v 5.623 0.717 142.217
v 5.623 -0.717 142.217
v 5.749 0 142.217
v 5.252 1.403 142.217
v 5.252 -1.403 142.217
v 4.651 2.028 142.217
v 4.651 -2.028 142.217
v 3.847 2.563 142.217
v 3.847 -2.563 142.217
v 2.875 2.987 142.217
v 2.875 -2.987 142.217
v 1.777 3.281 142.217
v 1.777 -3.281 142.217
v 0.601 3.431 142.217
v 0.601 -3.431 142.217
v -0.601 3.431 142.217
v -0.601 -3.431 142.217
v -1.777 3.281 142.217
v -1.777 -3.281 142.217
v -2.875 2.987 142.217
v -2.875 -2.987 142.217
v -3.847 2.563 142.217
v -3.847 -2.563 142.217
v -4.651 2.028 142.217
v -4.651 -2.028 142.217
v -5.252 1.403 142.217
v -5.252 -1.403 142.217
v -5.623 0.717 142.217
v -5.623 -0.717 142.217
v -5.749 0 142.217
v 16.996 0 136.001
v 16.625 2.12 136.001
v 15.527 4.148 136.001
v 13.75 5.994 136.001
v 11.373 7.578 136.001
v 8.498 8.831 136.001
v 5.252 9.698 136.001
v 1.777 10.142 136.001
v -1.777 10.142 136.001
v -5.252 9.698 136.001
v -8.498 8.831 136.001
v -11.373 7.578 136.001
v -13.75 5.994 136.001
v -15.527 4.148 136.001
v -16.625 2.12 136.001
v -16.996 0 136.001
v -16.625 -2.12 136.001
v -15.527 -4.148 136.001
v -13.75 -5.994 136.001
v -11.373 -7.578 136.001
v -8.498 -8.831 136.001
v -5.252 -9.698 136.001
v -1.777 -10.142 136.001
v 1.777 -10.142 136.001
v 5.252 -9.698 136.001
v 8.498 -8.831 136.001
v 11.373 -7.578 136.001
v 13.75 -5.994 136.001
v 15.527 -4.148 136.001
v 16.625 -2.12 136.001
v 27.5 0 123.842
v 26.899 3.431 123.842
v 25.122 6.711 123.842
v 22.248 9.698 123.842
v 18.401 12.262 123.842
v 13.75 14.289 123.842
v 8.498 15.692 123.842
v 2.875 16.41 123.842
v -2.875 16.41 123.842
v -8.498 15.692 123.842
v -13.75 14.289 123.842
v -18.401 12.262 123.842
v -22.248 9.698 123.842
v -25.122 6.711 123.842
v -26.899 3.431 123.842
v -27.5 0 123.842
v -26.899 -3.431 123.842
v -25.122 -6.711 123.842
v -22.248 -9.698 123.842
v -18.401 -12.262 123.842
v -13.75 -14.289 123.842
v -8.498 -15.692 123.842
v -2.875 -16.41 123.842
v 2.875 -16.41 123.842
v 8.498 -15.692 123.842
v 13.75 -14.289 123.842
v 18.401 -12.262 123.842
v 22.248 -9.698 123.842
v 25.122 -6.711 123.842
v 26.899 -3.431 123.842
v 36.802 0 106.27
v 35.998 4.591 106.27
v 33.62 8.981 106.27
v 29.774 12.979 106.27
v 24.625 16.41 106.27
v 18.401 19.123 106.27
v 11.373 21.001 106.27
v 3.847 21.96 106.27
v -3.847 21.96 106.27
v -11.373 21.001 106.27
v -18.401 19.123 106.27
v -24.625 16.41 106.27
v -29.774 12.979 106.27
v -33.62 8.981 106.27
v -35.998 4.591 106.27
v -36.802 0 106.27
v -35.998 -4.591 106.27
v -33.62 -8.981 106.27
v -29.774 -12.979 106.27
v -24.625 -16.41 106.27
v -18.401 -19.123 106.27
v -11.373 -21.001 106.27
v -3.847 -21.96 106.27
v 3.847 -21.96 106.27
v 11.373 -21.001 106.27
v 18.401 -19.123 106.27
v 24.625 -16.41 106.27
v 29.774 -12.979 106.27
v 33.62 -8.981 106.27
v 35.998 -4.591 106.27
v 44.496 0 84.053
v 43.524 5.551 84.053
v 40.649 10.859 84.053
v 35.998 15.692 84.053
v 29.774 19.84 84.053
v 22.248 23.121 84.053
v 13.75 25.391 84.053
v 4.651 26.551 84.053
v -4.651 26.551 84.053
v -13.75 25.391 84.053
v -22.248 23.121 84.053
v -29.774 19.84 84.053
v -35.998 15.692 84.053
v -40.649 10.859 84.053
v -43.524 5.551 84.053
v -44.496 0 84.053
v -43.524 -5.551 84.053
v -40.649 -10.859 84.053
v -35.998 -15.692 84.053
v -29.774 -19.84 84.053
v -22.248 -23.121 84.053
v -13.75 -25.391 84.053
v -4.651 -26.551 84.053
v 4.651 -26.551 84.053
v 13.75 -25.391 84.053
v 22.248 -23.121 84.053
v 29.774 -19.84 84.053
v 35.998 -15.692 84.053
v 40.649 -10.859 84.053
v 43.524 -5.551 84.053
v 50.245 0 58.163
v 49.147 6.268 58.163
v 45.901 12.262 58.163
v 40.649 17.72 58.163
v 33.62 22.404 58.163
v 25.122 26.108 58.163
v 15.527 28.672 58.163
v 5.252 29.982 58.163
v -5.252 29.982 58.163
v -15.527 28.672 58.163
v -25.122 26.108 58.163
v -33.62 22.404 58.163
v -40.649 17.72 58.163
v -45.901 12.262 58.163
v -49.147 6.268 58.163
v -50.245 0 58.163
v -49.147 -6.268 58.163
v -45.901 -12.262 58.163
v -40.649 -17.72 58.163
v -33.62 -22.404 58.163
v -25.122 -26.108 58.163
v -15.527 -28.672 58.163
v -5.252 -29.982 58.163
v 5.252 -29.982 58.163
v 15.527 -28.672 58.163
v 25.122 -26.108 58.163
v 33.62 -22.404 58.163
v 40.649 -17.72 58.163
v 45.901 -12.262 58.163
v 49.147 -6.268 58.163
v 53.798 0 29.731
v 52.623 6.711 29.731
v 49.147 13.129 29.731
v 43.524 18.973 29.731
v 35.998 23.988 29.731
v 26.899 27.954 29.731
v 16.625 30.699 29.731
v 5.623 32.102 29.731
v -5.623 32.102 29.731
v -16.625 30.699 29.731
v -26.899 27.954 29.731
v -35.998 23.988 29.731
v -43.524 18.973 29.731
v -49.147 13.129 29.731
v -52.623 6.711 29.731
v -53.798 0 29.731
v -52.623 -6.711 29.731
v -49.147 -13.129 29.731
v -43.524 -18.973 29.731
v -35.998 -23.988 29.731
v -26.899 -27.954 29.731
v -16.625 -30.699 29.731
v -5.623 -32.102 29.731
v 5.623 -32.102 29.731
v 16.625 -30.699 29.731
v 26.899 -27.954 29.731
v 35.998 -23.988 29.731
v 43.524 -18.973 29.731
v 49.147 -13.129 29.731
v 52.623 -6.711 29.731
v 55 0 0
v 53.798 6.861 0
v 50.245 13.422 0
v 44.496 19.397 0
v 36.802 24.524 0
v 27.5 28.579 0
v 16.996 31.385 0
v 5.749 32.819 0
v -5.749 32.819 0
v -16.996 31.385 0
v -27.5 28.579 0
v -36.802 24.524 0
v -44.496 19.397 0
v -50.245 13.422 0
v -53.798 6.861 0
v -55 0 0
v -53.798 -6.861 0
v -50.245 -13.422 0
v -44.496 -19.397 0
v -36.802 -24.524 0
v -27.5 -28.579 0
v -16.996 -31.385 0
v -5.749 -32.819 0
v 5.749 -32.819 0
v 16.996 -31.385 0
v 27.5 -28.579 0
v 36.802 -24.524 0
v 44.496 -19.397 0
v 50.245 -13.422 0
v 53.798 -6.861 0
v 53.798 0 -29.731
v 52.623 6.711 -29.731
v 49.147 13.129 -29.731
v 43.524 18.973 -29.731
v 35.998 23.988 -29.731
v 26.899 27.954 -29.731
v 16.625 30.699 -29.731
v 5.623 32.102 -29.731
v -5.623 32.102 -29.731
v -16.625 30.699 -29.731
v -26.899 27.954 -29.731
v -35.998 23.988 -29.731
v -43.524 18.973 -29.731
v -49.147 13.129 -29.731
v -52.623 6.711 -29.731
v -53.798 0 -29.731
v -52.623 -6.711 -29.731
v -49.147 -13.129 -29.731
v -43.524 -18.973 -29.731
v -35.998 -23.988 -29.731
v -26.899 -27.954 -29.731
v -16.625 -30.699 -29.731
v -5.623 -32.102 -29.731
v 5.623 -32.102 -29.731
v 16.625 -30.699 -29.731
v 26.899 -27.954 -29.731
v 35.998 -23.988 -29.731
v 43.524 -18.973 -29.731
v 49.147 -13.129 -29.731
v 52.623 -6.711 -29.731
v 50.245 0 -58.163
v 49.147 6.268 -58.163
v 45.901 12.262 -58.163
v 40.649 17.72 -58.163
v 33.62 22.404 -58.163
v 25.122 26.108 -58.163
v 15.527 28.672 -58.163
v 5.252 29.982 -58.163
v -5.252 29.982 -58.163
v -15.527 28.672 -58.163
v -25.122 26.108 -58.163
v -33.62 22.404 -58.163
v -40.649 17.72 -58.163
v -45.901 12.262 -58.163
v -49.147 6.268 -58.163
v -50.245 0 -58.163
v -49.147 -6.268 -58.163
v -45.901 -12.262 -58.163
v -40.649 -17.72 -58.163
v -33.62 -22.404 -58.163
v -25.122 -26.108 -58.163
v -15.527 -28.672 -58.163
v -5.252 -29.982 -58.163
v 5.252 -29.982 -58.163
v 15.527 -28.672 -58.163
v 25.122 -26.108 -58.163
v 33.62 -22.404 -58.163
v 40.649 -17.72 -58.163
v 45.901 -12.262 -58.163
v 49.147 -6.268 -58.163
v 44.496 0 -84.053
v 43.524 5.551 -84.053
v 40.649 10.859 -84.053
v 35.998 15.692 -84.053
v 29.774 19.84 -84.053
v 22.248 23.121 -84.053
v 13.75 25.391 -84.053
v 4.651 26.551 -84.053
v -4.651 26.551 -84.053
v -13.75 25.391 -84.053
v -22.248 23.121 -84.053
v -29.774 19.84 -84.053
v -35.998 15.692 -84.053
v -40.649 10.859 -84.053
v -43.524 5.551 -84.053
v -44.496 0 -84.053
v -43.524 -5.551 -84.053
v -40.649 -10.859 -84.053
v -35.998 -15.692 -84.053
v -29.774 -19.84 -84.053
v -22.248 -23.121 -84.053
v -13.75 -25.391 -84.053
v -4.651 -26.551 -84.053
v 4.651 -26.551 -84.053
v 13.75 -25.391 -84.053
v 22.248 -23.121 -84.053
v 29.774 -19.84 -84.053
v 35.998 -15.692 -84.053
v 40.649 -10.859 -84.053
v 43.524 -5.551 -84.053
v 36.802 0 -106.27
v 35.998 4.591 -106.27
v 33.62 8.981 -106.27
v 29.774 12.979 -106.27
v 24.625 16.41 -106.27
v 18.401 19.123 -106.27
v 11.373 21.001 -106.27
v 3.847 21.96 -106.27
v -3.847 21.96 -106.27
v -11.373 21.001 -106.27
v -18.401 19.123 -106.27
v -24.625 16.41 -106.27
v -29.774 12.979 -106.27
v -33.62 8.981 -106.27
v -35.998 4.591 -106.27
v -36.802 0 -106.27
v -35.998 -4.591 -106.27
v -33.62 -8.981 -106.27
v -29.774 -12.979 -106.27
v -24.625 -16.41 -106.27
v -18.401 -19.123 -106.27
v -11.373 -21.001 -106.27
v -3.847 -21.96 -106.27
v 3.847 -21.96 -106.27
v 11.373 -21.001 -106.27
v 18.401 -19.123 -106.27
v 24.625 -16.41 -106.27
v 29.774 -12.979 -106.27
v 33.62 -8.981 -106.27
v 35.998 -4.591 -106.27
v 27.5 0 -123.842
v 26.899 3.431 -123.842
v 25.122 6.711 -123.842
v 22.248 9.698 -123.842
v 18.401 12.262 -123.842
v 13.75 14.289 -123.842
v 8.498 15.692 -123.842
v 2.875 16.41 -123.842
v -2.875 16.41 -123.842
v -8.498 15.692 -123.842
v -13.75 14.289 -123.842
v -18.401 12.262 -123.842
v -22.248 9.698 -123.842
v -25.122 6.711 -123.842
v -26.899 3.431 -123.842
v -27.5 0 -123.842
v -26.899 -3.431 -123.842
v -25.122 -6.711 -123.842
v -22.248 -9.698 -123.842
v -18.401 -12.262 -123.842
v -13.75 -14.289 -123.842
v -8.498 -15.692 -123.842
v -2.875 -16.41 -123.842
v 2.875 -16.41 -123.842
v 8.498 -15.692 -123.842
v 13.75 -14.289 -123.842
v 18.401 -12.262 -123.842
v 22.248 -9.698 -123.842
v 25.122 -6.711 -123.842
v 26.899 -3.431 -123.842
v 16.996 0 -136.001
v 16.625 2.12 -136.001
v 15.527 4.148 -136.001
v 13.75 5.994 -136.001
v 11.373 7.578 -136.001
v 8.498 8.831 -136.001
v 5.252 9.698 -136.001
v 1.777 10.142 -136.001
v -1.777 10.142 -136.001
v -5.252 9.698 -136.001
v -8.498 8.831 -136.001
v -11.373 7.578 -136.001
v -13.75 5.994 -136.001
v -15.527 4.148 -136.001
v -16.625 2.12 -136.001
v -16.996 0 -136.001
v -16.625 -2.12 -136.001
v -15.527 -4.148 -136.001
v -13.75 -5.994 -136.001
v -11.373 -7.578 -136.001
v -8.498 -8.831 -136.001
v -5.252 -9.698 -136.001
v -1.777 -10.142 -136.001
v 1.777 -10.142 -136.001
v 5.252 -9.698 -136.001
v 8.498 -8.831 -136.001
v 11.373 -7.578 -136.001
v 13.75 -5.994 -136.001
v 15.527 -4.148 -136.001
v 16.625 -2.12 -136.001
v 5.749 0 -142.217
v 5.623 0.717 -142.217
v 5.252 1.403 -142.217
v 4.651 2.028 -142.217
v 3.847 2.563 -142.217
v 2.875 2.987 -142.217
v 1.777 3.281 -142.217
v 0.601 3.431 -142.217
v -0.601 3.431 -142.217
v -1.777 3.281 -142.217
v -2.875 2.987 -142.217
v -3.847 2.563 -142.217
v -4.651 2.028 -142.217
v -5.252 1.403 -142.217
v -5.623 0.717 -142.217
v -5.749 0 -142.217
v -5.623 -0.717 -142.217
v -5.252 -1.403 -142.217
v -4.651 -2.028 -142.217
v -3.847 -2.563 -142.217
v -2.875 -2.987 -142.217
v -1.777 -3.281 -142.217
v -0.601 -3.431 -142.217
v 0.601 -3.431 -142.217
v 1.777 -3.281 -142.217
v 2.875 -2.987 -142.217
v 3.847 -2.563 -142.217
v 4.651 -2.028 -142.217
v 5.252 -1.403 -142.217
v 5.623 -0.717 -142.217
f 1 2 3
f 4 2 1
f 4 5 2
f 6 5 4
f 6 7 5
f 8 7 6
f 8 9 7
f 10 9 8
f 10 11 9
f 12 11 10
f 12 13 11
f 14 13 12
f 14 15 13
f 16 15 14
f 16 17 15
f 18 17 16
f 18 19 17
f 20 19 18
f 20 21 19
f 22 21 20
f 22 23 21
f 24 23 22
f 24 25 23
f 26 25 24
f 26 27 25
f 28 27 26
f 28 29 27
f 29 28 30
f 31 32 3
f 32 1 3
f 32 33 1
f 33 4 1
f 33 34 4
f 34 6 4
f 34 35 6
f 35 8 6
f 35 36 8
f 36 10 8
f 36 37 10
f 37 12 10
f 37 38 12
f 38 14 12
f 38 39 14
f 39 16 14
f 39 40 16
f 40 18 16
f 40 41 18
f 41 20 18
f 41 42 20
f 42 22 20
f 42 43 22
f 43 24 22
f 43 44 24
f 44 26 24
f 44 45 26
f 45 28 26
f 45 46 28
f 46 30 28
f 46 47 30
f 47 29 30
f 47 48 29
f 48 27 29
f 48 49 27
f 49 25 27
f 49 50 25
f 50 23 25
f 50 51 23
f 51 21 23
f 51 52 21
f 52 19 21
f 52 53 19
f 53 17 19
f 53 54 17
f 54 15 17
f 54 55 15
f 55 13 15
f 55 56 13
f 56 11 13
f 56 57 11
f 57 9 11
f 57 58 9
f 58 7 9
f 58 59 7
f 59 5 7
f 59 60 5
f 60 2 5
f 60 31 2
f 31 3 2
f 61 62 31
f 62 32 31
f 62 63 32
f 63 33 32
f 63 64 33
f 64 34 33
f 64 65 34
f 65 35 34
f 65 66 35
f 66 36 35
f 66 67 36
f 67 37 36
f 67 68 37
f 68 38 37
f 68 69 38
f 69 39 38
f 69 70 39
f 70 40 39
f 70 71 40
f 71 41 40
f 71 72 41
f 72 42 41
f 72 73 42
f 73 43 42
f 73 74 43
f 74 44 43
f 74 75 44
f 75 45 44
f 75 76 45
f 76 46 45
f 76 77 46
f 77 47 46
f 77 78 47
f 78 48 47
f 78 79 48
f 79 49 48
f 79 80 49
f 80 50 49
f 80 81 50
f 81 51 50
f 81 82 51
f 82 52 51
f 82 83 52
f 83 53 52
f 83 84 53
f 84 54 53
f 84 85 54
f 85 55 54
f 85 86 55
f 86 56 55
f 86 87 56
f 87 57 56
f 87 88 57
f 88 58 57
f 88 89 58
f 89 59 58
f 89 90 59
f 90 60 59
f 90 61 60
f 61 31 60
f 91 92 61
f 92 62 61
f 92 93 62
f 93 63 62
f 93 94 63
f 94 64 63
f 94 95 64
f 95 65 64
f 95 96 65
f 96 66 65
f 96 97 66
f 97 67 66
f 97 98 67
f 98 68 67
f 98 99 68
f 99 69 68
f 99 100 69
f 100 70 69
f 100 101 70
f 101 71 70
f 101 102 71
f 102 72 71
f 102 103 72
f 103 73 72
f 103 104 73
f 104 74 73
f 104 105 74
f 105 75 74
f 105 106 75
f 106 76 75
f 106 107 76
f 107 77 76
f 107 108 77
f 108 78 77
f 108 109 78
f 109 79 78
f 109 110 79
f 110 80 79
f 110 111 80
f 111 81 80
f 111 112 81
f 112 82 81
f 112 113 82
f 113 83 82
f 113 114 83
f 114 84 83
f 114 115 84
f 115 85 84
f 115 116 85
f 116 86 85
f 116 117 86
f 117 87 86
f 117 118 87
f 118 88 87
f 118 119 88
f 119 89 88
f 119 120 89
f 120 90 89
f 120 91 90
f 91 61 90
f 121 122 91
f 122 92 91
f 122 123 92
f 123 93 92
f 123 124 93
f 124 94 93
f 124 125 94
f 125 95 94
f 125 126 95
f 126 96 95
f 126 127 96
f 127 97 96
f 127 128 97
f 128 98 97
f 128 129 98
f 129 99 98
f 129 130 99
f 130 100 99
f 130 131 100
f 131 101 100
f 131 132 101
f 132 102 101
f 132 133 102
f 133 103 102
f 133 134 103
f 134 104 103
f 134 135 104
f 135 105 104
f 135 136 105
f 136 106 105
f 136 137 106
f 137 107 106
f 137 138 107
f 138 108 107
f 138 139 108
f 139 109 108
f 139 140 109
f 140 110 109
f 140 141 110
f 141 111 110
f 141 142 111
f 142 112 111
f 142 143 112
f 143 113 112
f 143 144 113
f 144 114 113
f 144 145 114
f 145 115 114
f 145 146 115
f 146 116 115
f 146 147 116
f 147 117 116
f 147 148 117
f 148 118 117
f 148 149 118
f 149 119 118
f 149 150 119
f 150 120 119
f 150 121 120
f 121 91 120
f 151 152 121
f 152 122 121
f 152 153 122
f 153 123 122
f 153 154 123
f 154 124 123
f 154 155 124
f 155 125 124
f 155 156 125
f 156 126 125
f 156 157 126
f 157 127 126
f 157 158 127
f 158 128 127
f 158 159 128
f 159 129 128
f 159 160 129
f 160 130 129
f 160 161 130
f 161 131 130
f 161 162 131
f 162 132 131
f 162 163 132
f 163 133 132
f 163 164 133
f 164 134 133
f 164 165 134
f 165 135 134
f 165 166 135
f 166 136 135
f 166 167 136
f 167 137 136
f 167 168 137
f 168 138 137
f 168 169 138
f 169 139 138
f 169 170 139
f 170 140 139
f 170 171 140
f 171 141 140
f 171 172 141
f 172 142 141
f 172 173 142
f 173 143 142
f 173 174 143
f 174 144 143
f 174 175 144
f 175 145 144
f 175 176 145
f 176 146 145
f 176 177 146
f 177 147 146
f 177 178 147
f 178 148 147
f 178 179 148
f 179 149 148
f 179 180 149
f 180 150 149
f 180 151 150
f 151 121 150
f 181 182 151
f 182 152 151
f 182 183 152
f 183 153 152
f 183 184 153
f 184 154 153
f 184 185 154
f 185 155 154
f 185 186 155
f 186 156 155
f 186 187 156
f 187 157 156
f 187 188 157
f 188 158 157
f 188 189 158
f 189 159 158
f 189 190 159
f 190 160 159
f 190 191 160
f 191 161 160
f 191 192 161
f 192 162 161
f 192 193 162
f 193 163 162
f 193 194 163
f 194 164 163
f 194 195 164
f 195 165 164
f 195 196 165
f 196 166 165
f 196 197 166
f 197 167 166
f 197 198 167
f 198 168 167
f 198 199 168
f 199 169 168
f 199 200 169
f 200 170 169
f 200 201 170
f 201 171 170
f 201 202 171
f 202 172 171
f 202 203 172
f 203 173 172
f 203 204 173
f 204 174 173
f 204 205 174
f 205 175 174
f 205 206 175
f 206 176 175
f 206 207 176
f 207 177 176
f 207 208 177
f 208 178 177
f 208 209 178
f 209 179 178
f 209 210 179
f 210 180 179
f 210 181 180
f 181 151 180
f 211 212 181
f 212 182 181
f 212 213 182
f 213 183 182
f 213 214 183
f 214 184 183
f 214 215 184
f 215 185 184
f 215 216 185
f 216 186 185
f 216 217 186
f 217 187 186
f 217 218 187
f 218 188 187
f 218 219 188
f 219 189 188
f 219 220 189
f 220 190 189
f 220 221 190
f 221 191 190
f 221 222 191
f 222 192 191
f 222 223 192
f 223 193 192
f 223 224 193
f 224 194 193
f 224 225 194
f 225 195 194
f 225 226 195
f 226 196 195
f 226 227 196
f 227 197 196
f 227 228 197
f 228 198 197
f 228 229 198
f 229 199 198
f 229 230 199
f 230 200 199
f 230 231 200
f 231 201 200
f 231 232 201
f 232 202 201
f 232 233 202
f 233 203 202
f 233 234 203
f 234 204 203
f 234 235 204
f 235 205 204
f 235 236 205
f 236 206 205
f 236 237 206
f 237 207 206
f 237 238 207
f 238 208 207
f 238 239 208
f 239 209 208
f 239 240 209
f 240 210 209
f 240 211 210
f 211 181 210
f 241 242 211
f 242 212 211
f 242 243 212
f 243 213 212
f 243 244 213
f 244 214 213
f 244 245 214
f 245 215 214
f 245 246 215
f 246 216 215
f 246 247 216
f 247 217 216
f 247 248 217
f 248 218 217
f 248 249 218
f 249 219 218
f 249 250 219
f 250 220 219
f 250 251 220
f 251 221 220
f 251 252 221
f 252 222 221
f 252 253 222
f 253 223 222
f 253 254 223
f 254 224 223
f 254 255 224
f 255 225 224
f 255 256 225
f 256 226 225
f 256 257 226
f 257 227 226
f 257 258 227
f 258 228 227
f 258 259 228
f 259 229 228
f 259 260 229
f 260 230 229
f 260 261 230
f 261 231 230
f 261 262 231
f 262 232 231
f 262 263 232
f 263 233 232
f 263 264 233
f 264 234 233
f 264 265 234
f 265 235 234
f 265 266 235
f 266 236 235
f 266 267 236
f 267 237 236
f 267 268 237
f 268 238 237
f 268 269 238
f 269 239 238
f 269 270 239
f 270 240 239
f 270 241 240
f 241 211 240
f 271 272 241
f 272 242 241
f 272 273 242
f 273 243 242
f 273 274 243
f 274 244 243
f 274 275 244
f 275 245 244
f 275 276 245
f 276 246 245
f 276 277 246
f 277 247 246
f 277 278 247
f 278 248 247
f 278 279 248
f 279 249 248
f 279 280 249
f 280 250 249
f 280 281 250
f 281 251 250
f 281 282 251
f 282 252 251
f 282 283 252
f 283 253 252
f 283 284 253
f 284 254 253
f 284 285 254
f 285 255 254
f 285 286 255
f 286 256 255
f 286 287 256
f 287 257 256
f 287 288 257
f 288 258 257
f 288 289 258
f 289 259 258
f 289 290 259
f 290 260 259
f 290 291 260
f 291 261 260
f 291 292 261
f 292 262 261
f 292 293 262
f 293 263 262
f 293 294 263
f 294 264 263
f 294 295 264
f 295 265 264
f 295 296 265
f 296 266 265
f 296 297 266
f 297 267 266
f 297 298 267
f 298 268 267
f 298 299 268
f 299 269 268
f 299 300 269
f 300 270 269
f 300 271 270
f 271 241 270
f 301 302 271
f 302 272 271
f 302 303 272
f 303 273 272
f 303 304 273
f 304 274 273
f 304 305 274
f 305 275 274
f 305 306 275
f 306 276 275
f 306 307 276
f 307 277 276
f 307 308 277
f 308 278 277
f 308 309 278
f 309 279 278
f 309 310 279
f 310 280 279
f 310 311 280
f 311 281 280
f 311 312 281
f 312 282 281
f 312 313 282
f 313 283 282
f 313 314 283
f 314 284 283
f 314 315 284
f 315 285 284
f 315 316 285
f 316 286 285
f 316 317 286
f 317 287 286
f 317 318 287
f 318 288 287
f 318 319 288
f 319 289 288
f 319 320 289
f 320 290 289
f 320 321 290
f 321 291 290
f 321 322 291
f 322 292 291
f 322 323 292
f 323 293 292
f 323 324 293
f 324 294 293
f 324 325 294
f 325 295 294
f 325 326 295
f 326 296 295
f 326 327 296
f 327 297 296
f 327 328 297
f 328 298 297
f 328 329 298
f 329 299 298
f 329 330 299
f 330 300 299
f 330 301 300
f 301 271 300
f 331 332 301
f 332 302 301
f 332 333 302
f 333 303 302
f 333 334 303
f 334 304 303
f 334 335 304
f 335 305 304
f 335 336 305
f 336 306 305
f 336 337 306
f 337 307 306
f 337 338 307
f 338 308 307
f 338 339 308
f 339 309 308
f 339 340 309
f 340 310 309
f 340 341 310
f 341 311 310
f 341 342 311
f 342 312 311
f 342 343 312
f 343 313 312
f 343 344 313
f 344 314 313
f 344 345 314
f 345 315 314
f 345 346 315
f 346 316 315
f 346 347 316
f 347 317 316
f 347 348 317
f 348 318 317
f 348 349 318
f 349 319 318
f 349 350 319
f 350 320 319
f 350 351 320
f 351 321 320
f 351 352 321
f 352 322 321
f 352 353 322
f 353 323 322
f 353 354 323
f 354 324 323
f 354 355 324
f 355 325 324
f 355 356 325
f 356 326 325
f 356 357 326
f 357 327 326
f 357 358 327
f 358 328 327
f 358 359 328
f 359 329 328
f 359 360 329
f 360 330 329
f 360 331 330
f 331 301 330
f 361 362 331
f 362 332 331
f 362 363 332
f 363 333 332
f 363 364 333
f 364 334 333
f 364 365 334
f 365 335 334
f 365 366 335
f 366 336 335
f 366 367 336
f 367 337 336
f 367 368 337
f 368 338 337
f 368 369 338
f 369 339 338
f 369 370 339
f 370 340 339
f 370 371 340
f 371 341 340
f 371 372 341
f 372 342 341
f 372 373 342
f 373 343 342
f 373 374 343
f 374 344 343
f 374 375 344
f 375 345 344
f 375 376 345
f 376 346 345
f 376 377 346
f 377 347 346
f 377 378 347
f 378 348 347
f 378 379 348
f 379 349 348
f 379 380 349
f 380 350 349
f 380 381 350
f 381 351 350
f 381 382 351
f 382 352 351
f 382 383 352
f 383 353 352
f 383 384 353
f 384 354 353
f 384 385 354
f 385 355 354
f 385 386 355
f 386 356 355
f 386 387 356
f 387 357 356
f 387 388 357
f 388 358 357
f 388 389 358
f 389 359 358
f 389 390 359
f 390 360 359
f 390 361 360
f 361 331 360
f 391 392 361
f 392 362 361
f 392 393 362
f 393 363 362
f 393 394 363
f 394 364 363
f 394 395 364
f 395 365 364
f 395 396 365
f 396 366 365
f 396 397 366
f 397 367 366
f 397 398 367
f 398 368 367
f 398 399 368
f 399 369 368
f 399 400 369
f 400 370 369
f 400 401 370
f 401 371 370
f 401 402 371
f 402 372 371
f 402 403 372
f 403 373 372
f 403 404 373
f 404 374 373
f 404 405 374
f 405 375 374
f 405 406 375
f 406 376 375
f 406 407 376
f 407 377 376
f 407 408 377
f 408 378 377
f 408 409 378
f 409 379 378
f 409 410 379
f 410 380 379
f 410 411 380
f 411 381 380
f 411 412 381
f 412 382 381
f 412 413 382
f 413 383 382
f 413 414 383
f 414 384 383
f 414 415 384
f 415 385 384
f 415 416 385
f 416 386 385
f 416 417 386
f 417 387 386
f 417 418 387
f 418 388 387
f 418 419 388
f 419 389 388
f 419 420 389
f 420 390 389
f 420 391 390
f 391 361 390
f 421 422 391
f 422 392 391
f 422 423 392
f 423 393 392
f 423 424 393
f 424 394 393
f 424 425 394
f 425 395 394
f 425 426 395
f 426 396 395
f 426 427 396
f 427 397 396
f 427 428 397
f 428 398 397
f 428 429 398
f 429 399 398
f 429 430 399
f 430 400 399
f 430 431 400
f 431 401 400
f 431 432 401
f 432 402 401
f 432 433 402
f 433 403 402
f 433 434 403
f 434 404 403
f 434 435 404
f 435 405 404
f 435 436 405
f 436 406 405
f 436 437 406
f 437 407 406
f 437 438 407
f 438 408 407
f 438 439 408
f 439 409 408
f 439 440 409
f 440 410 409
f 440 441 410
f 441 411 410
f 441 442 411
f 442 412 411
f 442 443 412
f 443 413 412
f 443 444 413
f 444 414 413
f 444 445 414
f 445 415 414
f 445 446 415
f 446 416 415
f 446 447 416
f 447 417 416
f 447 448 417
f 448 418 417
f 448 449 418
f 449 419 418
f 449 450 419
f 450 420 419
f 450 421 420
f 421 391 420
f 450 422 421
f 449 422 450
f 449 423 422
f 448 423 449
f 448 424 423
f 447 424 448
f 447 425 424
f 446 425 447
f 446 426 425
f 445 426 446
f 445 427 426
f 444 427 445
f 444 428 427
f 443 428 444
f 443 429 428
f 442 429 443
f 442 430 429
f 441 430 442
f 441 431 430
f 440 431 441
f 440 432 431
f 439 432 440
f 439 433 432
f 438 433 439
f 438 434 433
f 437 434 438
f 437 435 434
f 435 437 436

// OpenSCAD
// Generated by SolidPython 1.0.1 on 2020-07-29 00:46:46


scale(v = [5, 3, 13]) {
	sphere(r = 11);
}
/***********************************************
*********      SolidPython code:      **********
************************************************
 
# import packages: SolidPython
from solid import *
from solid.utils import *
from itertools import chain, combinations, permutations


class Resize:

    def __init__(self, scad_file):
        self.scad_file = scad_file
        #self.scad_file = import_scad(scad_file)
        # cone/cylinder param:
        self.r1 = 0
        self.r2 = 0
        self.h = 0
        # rectangular prism param:
        self.w = 0
        self.l = 0
        # ellipse param:
        self.r = 0

    # import OpenScad code (file name corresponds to shape)


    # classify shape + parameters
    def assign(self, param1, param2, param3):
        if self.scad_file == 'cone.scad':
            self.r1 = param1
            self.r2 = param2
            self.h = param3
        elif self.scad_file == 'cylinder.scad':
            self.r1 = param1
            self.r2 = param2
            self.h = param3
        elif self.scad_file == 'rectangularPrism.scad':
            self.h = param1
            self.l = param2
            self.w = param3
        else:
            self.r = param1
            self.h = param2

    # resize parameters
    def iterate(self):
        x = range(3, 20, 2)
        i = 1
        if self.scad_file == 'cone.scad':
            tempList = list(permutations(x, 2))
            for temp in tempList:
                param1 = temp[0]
                param2 = temp[1]
                filepath = 'produced_scad_files/' + 'cone' + str(param1) + '_' + str(param2) + '_' + '.scad'
                scad_render_to_file(cylinder(h=param1, r1=param2, r2=0), filepath)

        elif self.scad_file == 'cylinder.scad':
            tempList = list(permutations(x, 3))
            for temp in tempList:
                param1 = temp[0]
                param2 = temp[1]
                filepath = 'produced_scad_files/' + 'cylinder' + str(param1) + '_' + str(param2) + '_' + '.scad'
                scad_render_to_file(cylinder(h=param1, r1=param2, r2=param2), filepath)

        elif self.scad_file == 'rectangularPrism.scad':
            tempList = list(permutations(x, 3))
            for temp in tempList:
                param1 = temp[0]
                param2 = temp[1]
                param3 = temp[2]
                filepath = 'produced_scad_files/' + 'rectangularPrism' + str(param1) + '_' + str(param2) + '_' + str(
                    param3) + '.scad'
                scad_render_to_file(cube(size=(param1, param2, param3)), filepath)

        elif self.scad_file == 'ellipse.scad':
            tempList = list(permutations(x, 4))
            for temp in tempList:
                param1 = temp[0]
                param2 = temp[1]
                param3 = temp[2]
                param4 = temp[3]
                filepath = 'produced_scad_files/' + 'ellipse' + str(param1) + '_' + str(param2) + '_' + str(param3) + '_' + str(param4) + '.scad'
                scad_render_to_file(scale([param1, param2, param3])(sphere(r=param4)), filepath)

    def render_to_scadfile(self):
        scad_render_to_file(scad, 'example.scad') 
 
************************************************/
